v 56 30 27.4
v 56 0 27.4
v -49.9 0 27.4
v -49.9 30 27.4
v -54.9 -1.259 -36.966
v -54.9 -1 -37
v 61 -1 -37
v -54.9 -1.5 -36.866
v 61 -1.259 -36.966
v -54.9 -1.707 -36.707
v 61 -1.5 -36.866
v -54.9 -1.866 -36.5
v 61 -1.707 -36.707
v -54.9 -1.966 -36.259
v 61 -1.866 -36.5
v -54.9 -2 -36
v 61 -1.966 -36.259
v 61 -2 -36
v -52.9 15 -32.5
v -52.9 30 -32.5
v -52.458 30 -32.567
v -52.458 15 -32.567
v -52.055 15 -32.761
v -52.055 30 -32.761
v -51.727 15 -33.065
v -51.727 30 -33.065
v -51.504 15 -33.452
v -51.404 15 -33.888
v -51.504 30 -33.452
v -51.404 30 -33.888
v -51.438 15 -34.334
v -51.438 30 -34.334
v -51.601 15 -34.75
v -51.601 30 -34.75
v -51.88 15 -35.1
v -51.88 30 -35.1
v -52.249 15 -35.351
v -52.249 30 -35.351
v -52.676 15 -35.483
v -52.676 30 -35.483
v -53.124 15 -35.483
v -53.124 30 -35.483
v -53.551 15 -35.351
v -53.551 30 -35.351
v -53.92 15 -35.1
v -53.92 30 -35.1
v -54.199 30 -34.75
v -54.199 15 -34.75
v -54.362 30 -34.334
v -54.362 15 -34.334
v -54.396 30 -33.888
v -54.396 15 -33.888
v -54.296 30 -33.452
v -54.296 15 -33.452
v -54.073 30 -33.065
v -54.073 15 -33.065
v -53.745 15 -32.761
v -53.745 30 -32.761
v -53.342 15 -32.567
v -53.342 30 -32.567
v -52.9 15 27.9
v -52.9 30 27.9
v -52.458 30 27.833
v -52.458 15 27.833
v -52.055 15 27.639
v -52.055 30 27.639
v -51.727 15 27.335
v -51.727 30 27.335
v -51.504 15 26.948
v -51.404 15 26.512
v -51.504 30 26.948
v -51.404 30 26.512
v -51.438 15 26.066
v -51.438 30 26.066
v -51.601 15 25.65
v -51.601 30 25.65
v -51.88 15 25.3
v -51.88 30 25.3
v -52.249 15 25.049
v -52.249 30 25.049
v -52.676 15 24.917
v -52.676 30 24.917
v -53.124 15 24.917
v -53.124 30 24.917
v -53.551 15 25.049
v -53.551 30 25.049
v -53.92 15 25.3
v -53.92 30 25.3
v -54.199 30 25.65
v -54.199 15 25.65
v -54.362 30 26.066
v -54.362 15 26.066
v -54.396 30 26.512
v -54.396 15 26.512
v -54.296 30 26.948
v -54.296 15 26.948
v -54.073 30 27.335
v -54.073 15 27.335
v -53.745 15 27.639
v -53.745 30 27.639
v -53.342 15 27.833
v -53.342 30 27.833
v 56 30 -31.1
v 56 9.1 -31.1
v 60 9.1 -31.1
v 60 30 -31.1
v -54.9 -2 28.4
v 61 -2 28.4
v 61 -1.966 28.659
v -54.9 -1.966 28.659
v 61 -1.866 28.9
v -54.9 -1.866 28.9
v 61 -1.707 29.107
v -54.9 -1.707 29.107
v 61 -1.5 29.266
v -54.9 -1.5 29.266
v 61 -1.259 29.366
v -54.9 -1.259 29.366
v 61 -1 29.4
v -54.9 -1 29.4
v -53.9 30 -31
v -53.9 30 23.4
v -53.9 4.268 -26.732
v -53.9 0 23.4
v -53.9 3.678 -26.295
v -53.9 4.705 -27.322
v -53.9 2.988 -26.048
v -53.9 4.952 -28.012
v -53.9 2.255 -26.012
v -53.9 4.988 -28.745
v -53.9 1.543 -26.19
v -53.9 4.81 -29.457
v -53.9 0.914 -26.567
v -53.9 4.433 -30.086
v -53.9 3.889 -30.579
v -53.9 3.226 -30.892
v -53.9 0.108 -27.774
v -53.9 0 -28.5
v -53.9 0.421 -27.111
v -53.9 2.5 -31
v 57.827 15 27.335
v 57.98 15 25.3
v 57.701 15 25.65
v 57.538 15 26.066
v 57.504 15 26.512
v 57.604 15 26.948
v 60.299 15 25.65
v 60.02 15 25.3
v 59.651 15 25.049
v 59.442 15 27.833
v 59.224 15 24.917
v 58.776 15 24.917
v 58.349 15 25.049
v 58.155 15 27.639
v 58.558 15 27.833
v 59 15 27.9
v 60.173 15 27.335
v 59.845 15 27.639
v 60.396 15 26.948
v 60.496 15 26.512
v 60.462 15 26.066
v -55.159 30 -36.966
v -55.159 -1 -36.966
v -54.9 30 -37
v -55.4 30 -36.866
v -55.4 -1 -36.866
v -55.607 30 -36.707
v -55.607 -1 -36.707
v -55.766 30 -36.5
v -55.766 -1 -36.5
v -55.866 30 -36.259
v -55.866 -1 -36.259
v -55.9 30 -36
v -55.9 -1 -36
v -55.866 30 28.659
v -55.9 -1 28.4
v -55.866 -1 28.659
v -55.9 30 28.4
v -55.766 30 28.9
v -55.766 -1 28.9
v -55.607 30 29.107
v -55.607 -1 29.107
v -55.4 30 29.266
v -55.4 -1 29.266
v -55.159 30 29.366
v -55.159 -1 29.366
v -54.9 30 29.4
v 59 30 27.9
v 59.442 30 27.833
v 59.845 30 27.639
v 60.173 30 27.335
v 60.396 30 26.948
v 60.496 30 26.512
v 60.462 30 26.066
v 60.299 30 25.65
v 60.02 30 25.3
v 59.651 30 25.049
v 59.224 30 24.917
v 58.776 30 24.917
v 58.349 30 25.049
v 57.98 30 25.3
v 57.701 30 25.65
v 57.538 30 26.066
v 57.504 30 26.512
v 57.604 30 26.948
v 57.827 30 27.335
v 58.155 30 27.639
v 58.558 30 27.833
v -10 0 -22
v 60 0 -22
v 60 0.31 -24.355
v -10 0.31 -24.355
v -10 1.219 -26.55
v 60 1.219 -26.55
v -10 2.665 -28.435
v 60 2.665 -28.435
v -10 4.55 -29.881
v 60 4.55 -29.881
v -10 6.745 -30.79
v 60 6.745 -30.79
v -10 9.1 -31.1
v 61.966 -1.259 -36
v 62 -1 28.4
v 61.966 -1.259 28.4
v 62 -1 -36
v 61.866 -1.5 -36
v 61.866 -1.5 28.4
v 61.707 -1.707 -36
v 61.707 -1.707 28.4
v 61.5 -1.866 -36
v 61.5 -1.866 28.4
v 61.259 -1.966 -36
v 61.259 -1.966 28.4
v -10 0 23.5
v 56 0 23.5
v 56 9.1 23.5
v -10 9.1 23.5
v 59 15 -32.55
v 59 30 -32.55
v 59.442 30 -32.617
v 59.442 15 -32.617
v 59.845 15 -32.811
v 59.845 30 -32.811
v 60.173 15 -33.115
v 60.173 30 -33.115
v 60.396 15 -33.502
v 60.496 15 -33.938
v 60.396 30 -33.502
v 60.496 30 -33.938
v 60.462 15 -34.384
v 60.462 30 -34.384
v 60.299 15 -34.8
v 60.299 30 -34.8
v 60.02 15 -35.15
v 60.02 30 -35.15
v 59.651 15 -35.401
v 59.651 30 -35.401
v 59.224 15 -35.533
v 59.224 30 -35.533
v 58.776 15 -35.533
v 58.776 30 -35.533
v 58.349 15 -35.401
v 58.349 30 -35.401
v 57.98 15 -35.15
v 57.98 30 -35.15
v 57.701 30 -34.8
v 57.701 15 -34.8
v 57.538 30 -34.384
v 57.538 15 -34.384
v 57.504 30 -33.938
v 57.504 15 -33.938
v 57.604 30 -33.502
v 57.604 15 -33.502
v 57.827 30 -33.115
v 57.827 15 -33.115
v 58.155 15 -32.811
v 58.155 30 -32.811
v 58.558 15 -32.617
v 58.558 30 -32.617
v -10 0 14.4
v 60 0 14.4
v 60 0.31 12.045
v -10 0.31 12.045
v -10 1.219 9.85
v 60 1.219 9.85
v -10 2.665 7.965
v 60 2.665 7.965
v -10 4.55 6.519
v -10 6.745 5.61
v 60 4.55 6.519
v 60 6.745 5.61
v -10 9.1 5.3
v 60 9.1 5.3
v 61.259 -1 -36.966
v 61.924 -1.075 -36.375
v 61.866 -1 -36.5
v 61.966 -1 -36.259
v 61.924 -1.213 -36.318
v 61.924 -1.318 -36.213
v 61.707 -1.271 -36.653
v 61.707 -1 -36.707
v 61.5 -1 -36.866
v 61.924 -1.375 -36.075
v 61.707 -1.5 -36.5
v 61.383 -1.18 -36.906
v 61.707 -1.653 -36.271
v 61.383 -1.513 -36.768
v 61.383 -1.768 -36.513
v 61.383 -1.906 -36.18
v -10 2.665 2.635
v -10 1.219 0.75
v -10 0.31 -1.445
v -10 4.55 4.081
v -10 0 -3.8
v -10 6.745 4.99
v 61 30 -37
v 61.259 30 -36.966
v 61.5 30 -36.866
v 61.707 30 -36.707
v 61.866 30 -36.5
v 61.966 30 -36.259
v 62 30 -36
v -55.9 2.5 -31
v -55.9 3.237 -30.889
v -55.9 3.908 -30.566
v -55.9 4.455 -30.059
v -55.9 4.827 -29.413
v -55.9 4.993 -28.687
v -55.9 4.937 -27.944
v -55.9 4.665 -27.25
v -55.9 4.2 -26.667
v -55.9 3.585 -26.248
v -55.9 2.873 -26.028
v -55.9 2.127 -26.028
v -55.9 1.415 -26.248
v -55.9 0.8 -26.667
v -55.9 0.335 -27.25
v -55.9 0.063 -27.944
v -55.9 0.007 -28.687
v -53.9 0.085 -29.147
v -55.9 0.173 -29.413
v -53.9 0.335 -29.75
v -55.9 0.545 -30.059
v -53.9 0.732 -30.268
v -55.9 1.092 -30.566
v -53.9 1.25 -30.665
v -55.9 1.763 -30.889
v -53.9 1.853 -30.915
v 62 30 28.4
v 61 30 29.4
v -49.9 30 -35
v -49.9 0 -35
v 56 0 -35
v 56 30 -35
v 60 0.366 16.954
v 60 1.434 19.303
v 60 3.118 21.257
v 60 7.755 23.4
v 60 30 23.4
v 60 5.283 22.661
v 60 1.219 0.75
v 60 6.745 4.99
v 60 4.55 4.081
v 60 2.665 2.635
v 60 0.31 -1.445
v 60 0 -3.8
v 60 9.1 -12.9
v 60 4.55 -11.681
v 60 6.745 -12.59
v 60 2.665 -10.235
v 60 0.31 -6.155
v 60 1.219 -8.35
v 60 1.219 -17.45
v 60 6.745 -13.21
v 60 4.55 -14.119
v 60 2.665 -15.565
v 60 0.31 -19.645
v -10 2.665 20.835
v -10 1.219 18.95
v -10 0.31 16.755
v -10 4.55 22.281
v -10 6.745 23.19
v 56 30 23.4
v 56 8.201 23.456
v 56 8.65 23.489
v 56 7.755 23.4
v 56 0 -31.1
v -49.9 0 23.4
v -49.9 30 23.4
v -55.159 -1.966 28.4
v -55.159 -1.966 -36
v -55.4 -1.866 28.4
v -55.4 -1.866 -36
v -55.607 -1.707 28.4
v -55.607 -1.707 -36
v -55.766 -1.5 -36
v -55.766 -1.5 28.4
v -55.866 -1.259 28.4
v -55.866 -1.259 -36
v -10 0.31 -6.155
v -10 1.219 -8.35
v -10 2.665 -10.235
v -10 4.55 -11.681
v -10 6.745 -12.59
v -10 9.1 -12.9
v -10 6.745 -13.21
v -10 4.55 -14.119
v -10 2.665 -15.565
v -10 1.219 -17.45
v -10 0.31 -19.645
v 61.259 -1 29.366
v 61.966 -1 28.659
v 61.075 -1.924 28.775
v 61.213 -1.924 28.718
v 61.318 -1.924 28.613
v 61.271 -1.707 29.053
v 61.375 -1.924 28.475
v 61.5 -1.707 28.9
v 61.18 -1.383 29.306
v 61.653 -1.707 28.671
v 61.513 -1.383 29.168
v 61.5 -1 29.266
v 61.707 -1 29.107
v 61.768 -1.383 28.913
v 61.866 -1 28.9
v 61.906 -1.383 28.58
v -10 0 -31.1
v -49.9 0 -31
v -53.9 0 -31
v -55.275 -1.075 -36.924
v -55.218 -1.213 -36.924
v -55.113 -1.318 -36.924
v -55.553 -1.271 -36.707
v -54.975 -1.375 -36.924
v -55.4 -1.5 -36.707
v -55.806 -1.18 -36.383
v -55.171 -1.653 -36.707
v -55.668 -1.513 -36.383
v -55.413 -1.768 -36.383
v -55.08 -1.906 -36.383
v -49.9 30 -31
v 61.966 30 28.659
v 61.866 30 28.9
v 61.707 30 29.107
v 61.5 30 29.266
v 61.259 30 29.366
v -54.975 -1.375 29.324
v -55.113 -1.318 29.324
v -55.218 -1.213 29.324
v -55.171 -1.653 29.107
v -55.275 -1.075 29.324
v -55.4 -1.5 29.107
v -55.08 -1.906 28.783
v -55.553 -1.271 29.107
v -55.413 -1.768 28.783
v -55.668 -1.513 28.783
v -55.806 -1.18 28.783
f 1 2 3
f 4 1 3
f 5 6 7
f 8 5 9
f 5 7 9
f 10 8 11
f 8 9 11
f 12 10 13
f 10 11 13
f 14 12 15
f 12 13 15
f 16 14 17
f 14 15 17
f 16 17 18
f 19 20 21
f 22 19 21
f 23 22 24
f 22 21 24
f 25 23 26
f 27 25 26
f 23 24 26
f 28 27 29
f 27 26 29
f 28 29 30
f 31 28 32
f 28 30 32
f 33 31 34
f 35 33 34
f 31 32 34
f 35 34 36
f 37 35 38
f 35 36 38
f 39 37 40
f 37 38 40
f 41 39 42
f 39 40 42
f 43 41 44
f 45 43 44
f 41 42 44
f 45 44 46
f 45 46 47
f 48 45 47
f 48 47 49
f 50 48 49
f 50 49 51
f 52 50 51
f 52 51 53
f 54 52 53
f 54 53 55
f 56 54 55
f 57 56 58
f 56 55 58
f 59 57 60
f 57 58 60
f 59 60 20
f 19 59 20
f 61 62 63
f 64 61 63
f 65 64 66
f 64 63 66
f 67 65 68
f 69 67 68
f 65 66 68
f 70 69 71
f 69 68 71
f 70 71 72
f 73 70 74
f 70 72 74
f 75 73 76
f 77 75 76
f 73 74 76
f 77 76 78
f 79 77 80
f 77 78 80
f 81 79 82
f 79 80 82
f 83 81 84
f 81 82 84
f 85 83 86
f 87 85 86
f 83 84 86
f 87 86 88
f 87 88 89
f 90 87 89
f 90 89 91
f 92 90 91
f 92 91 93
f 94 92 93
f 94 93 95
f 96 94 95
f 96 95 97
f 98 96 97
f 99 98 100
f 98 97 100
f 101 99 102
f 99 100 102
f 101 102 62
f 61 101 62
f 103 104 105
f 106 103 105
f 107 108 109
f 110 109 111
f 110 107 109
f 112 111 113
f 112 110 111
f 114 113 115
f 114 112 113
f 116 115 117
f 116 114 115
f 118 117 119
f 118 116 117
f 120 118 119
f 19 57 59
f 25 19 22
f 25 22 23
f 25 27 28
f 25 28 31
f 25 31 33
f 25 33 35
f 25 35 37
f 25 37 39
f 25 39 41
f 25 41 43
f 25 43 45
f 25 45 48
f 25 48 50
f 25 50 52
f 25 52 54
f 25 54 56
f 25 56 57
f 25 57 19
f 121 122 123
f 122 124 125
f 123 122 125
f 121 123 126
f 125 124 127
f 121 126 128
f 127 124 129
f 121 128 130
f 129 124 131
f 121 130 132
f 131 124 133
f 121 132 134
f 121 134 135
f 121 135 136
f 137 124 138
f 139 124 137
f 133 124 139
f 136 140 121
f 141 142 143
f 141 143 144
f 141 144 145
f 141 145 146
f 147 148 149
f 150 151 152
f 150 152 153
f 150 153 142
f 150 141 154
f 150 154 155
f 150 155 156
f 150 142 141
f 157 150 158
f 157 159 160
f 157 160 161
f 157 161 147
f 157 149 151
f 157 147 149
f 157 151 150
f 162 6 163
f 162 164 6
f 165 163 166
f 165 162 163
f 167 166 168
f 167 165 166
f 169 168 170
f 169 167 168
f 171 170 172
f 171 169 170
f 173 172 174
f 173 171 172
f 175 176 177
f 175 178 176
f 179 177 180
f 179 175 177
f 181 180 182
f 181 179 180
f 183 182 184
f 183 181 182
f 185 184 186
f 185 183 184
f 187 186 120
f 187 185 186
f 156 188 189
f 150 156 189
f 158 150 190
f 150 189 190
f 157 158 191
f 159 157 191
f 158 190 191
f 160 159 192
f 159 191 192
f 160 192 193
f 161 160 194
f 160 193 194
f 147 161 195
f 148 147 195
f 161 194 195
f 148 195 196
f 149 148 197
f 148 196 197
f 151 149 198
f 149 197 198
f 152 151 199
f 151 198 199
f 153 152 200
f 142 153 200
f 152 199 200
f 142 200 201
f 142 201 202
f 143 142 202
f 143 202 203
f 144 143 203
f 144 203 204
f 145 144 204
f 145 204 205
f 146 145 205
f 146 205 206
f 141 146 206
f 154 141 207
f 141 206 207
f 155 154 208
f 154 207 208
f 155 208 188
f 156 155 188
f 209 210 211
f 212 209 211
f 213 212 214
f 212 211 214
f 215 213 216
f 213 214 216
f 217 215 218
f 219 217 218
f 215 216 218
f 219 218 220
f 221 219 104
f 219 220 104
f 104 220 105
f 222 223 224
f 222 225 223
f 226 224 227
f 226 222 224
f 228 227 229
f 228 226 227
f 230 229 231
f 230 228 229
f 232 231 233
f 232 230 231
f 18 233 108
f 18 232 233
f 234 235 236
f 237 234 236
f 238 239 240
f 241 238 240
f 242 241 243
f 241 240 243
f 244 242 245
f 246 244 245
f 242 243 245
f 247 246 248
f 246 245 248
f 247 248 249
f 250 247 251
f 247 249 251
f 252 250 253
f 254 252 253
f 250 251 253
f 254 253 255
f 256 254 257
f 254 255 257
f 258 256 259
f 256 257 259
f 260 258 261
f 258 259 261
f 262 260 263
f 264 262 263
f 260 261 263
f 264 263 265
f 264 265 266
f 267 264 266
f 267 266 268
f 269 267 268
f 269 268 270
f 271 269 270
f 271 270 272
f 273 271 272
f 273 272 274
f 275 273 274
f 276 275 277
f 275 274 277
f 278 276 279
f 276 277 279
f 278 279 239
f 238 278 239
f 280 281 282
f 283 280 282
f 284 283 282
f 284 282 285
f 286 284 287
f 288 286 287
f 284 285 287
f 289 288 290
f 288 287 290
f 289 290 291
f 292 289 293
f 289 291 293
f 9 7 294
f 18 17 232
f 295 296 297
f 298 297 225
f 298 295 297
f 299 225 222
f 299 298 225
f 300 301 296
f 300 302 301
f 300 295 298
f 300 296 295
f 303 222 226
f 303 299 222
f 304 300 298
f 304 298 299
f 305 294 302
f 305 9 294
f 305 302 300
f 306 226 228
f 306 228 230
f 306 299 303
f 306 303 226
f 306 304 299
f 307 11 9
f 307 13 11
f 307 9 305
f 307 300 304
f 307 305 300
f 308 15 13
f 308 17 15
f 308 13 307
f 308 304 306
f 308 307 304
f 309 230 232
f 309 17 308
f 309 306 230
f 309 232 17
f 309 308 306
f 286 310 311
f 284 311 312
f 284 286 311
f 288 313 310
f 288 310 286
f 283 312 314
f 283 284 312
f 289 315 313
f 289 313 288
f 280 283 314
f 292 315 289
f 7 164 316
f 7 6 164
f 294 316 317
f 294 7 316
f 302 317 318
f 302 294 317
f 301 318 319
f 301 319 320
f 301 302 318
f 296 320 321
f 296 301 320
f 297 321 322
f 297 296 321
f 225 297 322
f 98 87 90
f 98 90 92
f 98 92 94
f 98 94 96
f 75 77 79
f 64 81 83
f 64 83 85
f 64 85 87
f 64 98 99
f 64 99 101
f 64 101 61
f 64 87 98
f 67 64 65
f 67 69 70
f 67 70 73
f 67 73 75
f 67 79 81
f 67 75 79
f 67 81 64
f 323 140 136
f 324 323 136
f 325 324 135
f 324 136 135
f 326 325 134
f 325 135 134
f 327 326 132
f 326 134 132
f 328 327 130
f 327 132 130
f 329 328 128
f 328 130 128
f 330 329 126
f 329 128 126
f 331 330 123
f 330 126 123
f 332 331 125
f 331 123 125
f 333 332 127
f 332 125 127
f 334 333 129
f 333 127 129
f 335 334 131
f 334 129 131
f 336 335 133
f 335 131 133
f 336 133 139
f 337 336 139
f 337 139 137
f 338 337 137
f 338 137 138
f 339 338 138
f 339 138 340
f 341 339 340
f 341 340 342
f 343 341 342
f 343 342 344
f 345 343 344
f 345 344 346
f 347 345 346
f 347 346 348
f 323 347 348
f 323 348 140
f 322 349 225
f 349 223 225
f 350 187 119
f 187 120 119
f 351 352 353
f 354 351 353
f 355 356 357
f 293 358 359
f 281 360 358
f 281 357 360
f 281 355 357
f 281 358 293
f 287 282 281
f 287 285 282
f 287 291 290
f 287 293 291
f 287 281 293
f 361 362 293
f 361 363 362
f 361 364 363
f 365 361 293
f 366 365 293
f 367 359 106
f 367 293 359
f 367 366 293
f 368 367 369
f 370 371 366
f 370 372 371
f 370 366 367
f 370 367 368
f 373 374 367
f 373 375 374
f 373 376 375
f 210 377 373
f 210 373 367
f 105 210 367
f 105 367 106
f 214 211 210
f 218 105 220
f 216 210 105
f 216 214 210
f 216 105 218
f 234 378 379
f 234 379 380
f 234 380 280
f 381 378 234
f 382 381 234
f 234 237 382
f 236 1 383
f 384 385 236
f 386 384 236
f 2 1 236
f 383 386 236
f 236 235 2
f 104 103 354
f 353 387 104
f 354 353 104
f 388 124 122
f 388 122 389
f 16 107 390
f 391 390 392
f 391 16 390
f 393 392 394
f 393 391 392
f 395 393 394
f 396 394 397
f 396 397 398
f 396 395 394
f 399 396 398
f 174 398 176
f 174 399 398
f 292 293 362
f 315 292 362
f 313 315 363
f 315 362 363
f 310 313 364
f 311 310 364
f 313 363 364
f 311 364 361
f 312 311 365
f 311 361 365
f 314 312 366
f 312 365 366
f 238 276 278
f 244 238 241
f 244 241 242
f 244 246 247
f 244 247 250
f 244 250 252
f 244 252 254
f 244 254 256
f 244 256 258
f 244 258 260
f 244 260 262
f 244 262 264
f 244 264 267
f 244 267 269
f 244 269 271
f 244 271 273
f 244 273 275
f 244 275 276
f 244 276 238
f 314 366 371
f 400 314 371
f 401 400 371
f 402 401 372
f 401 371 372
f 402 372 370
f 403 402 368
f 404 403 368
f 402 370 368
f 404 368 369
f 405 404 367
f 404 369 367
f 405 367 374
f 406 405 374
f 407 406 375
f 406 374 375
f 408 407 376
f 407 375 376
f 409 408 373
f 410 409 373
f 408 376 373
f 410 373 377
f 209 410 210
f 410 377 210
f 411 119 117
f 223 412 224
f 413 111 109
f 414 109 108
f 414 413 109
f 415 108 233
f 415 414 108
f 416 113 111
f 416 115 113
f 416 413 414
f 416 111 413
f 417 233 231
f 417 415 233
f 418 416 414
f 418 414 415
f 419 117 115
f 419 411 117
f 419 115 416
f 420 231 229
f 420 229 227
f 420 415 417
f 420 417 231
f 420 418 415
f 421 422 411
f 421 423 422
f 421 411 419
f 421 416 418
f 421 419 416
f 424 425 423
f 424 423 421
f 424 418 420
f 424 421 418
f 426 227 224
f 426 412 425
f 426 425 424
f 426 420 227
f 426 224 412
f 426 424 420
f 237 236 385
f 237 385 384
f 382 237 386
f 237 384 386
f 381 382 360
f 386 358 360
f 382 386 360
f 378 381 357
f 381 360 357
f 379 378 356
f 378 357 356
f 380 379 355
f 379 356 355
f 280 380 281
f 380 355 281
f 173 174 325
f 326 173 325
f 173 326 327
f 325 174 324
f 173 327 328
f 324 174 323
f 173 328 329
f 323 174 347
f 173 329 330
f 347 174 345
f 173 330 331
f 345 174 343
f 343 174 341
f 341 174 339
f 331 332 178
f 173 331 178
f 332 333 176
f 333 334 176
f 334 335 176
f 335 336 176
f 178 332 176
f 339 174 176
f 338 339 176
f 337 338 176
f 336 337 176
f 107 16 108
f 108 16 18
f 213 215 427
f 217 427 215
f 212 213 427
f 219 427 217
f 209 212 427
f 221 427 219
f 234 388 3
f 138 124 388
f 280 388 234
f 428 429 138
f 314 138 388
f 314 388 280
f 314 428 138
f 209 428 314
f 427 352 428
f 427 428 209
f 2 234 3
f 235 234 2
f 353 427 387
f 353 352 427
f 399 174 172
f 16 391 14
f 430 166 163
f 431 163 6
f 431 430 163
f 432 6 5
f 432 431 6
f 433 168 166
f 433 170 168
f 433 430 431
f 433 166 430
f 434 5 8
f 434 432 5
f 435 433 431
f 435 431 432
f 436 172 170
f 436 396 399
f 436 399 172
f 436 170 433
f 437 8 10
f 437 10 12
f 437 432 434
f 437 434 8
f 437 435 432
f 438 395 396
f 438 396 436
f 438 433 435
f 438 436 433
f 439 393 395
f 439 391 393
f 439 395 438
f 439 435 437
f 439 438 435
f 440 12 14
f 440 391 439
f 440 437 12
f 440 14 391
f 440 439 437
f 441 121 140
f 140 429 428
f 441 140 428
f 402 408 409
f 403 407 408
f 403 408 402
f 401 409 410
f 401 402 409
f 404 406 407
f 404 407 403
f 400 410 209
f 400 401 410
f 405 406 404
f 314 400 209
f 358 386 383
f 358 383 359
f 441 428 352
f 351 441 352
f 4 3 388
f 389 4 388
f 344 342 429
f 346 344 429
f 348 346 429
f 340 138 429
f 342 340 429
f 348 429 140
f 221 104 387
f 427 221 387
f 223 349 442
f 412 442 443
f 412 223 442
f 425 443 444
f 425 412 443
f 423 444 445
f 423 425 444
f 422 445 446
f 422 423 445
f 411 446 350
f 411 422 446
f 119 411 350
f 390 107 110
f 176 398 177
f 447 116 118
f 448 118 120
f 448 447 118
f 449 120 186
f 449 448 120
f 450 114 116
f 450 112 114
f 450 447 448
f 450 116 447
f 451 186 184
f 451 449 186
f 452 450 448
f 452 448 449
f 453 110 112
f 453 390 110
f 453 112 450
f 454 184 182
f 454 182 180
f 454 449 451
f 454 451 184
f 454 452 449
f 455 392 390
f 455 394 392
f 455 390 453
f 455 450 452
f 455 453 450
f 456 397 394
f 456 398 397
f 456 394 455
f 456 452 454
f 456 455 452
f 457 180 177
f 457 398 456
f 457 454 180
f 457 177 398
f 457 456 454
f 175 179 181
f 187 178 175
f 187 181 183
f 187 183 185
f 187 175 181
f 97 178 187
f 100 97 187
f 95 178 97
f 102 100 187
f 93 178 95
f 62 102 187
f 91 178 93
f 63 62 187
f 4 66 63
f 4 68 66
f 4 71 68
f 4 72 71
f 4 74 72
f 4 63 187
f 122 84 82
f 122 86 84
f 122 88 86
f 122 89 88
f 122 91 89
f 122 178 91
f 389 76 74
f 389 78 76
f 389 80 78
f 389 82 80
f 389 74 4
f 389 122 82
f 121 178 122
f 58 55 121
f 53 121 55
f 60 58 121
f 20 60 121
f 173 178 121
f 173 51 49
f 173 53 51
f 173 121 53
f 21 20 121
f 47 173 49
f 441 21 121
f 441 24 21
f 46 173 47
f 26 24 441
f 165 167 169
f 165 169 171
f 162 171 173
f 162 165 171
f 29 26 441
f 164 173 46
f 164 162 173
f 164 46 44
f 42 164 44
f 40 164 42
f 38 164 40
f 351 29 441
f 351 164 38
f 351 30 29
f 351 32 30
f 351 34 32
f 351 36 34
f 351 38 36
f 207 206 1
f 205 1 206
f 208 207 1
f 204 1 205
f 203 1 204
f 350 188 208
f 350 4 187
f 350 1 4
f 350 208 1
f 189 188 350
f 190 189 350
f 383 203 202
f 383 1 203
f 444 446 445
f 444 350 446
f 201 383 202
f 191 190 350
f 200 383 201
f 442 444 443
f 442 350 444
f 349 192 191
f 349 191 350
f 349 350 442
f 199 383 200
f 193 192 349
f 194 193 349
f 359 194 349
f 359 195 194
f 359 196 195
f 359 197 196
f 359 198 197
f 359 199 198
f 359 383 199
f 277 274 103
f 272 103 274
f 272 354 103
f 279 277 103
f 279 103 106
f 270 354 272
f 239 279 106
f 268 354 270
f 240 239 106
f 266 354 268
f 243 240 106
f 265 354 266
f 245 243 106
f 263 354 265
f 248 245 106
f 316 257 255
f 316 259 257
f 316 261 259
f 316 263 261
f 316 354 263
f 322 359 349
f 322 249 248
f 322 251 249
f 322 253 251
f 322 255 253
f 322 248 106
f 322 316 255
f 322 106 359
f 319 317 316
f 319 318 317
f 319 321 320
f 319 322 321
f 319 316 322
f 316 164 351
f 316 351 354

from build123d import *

# Parameters (mm, degrees)
SKETCH2_W               = 120
SKETCH2_H               = 70
BOSS_EXTRUDE1_DEPTH     = 30
SHELL1_T                = 2
CUT_EXTRUDE1_DEPTH      = 131.969462089
CUT_EXTRUDE1_DEPTH_BACK = 30
SKETCH3_R               = 2.5
BOSS_EXTRUDE2_DEPTH     = 70
CUT_EXTRUDE2_DEPTH      = 79.185676438
CUT_EXTRUDE2_DEPTH_BACK = 79.185676438
BOSS_EXTRUDE3_DEPTH     = 30
SKETCH7_W               = 3.836872944
SKETCH7_H               = 6.434844856
BOSS_EXTRUDE4_DEPTH     = 2
SKETCH8_R               = 2.5
CUT_EXTRUDE5_DEPTH      = 5
BOSS_EXTRUDE5_START     = -30
SKETCH10_W              = 6
SKETCH10_H              = 6
SKETCH10_H_2            = 5.9
BOSS_EXTRUDE5_DEPTH     = 30
SKETCH12_R              = 1.5
CUT_EXTRUDE6_DEPTH      = 15
FILLET2_R               = 1


with BuildPart() as part:
    # Sketch2 → Boss-Extrude1 (new body)
    with BuildSketch(Plane(origin=(0, 0, 0), x_dir=(1, 0, 0), z_dir=(0, 1, 0))):
        Rectangle(SKETCH2_W, SKETCH2_H)
    extrude(amount=BOSS_EXTRUDE1_DEPTH)

    # Shell1
    shell1_openings = [part.faces().sort_by_distance(p)[0] for p in [
        (0, 30, 0),
    ]]
    offset(amount=SHELL1_T, openings=shell1_openings, kind=Kind.INTERSECTION)

    # Sketch3 → Cut-Extrude1 (cut, two sides: drawn at the far end of the back side and taken through both)
    with BuildSketch(Plane(origin=(-60, 0, 0), x_dir=(0, 0, -1), z_dir=(1, 0, 0)).offset(-CUT_EXTRUDE1_DEPTH_BACK)):
        with Locations(Location((-28, 3, 0), (0, 0, 180))):
            Circle(SKETCH3_R)
    extrude(amount=CUT_EXTRUDE1_DEPTH + CUT_EXTRUDE1_DEPTH_BACK, mode=Mode.SUBTRACT)

    # Sketch4 → Boss-Extrude2 (add)
    with BuildSketch(Plane.ZY.offset(-60)):
        with BuildLine():
            ThreePointArc((-12.9, 9.1), (-15.565328291, 2.665328291), (-22, 0))
            Line((-22, 0), (-3.799999988, 0))
            ThreePointArc((-3.799999988, 0), (-10.234671705, 2.665328287), (-12.9, 9.1))
        make_face()
        with BuildLine():
            ThreePointArc((5.3, 9.1), (2.634671713, 2.665328295), (-3.799999988, 0))
            Line((-3.799999988, 0), (14.399999991, 0))
            ThreePointArc((14.399999991, 0), (7.965328288, 2.665328294), (5.3, 9.1))
        make_face()
        with BuildLine():
            ThreePointArc((23.5, 9.1), (20.834671706, 2.665328288), (14.399999991, 0))
            Line((14.399999991, 0), (23.5, 0))
            Line((23.5, 0), (23.5, 9.1))
        make_face()
        with BuildLine():
            ThreePointArc((-22, 0), (-28.434671709, 2.665328291), (-31.1, 9.1))
            Line((-31.1, 9.1), (-31.1, 0))
            Line((-31.1, 0), (-22, 0))
        make_face()
    extrude(amount=BOSS_EXTRUDE2_DEPTH)

    # Sketch5 → Cut-Extrude2 (cut, two sides: drawn at the far end of the back side and taken through both)
    with BuildSketch(Plane(origin=(0, 0, 0), x_dir=(1, 0, 0), z_dir=(0, 1, 0)).offset(-CUT_EXTRUDE2_DEPTH_BACK)):
        Polygon((-55.9, 39.544038894), (-55.9, -29.4), (62, -29.4), (62, -41.301551734), (-55.9, -41.301551734), (-67.058664884, -41.301551734), (-67.058664884, 39.544038894), align=None)
    extrude(amount=CUT_EXTRUDE2_DEPTH + CUT_EXTRUDE2_DEPTH_BACK, mode=Mode.SUBTRACT)

    # Sketch6 → Boss-Extrude3 (add)
    with BuildSketch(Plane(origin=(0, 0, 0), x_dir=(1, 0, 0), z_dir=(0, 1, 0))):
        Polygon((-55.9, 35), (-55.9, -29.4), (62, -29.4), (62, -27.4), (-53.9, -27.4), (-53.9, 35), align=None)
    extrude(amount=BOSS_EXTRUDE3_DEPTH)

    # Sketch7 → Boss-Extrude4 (add)
    with BuildSketch(Plane(origin=(62, 0, 0), x_dir=(0, 0, -1), z_dir=(1, 0, 0))):
        with Locations((-26.496817491, 3.217422428)):
            Rectangle(SKETCH7_W, SKETCH7_H)
    extrude(amount=-BOSS_EXTRUDE4_DEPTH)

    # Sketch8 → Cut-Extrude5 (cut)
    with BuildSketch(Plane(origin=(-53.9, 0, 0), x_dir=(0, 0, -1), z_dir=(1, 0, 0))):
        with Locations((28.5, 2.5)):
            Circle(SKETCH8_R)
    extrude(amount=-CUT_EXTRUDE5_DEPTH, mode=Mode.SUBTRACT)

    # Sketch10 → Boss-Extrude5 (add)
    with BuildSketch(Plane(origin=(0, 30, 0), x_dir=(1, 0, 0), z_dir=(0, 1, 0)).offset(BOSS_EXTRUDE5_START)):
        with Locations((-52.9, 34)):
            Rectangle(SKETCH10_W, SKETCH10_H)
        with Locations((-52.9, -26.4)):
            Rectangle(SKETCH10_W, SKETCH10_H)
        with Locations((59, 34.05)):
            Rectangle(SKETCH10_W, SKETCH10_H_2)
        with Locations((59, -26.4)):
            Rectangle(SKETCH10_W, SKETCH10_H)
    extrude(amount=BOSS_EXTRUDE5_DEPTH)

    # Sketch12 → Cut-Extrude6 (cut)
    with BuildSketch(Plane(origin=(0, 30, 0), x_dir=(1, 0, 0), z_dir=(0, 1, 0))):
        with Locations(Location((-52.9, 34, 0), (0, 0, 270))):
            Circle(SKETCH12_R)
        with Locations(Location((59, 34.05, 0), (0, 0, 270))):
            Circle(SKETCH12_R)
        with Locations(Location((59, -26.4, 0), (0, 0, 270))):
            Circle(SKETCH12_R)
        with Locations(Location((-52.9, -26.4, 0), (0, 0, 270))):
            Circle(SKETCH12_R)
    extrude(amount=-CUT_EXTRUDE6_DEPTH, mode=Mode.SUBTRACT)

    # Fillet2
    fillet2_edges = [part.edges().sort_by_distance(p)[0] for p in [
        (-55.9, -2, -3.8),
        (-55.9, 14, -37),
        (62, 14, 29.4),
        (3.05, -2, 29.4),
        (-55.9, 14, 29.4),
        (3.05, -2, -37),
        (62, 14, -37),
        (62, -2, -3.8),
    ]]
    fillet(fillet2_edges, radius=FILLET2_R)


solid = part.part
